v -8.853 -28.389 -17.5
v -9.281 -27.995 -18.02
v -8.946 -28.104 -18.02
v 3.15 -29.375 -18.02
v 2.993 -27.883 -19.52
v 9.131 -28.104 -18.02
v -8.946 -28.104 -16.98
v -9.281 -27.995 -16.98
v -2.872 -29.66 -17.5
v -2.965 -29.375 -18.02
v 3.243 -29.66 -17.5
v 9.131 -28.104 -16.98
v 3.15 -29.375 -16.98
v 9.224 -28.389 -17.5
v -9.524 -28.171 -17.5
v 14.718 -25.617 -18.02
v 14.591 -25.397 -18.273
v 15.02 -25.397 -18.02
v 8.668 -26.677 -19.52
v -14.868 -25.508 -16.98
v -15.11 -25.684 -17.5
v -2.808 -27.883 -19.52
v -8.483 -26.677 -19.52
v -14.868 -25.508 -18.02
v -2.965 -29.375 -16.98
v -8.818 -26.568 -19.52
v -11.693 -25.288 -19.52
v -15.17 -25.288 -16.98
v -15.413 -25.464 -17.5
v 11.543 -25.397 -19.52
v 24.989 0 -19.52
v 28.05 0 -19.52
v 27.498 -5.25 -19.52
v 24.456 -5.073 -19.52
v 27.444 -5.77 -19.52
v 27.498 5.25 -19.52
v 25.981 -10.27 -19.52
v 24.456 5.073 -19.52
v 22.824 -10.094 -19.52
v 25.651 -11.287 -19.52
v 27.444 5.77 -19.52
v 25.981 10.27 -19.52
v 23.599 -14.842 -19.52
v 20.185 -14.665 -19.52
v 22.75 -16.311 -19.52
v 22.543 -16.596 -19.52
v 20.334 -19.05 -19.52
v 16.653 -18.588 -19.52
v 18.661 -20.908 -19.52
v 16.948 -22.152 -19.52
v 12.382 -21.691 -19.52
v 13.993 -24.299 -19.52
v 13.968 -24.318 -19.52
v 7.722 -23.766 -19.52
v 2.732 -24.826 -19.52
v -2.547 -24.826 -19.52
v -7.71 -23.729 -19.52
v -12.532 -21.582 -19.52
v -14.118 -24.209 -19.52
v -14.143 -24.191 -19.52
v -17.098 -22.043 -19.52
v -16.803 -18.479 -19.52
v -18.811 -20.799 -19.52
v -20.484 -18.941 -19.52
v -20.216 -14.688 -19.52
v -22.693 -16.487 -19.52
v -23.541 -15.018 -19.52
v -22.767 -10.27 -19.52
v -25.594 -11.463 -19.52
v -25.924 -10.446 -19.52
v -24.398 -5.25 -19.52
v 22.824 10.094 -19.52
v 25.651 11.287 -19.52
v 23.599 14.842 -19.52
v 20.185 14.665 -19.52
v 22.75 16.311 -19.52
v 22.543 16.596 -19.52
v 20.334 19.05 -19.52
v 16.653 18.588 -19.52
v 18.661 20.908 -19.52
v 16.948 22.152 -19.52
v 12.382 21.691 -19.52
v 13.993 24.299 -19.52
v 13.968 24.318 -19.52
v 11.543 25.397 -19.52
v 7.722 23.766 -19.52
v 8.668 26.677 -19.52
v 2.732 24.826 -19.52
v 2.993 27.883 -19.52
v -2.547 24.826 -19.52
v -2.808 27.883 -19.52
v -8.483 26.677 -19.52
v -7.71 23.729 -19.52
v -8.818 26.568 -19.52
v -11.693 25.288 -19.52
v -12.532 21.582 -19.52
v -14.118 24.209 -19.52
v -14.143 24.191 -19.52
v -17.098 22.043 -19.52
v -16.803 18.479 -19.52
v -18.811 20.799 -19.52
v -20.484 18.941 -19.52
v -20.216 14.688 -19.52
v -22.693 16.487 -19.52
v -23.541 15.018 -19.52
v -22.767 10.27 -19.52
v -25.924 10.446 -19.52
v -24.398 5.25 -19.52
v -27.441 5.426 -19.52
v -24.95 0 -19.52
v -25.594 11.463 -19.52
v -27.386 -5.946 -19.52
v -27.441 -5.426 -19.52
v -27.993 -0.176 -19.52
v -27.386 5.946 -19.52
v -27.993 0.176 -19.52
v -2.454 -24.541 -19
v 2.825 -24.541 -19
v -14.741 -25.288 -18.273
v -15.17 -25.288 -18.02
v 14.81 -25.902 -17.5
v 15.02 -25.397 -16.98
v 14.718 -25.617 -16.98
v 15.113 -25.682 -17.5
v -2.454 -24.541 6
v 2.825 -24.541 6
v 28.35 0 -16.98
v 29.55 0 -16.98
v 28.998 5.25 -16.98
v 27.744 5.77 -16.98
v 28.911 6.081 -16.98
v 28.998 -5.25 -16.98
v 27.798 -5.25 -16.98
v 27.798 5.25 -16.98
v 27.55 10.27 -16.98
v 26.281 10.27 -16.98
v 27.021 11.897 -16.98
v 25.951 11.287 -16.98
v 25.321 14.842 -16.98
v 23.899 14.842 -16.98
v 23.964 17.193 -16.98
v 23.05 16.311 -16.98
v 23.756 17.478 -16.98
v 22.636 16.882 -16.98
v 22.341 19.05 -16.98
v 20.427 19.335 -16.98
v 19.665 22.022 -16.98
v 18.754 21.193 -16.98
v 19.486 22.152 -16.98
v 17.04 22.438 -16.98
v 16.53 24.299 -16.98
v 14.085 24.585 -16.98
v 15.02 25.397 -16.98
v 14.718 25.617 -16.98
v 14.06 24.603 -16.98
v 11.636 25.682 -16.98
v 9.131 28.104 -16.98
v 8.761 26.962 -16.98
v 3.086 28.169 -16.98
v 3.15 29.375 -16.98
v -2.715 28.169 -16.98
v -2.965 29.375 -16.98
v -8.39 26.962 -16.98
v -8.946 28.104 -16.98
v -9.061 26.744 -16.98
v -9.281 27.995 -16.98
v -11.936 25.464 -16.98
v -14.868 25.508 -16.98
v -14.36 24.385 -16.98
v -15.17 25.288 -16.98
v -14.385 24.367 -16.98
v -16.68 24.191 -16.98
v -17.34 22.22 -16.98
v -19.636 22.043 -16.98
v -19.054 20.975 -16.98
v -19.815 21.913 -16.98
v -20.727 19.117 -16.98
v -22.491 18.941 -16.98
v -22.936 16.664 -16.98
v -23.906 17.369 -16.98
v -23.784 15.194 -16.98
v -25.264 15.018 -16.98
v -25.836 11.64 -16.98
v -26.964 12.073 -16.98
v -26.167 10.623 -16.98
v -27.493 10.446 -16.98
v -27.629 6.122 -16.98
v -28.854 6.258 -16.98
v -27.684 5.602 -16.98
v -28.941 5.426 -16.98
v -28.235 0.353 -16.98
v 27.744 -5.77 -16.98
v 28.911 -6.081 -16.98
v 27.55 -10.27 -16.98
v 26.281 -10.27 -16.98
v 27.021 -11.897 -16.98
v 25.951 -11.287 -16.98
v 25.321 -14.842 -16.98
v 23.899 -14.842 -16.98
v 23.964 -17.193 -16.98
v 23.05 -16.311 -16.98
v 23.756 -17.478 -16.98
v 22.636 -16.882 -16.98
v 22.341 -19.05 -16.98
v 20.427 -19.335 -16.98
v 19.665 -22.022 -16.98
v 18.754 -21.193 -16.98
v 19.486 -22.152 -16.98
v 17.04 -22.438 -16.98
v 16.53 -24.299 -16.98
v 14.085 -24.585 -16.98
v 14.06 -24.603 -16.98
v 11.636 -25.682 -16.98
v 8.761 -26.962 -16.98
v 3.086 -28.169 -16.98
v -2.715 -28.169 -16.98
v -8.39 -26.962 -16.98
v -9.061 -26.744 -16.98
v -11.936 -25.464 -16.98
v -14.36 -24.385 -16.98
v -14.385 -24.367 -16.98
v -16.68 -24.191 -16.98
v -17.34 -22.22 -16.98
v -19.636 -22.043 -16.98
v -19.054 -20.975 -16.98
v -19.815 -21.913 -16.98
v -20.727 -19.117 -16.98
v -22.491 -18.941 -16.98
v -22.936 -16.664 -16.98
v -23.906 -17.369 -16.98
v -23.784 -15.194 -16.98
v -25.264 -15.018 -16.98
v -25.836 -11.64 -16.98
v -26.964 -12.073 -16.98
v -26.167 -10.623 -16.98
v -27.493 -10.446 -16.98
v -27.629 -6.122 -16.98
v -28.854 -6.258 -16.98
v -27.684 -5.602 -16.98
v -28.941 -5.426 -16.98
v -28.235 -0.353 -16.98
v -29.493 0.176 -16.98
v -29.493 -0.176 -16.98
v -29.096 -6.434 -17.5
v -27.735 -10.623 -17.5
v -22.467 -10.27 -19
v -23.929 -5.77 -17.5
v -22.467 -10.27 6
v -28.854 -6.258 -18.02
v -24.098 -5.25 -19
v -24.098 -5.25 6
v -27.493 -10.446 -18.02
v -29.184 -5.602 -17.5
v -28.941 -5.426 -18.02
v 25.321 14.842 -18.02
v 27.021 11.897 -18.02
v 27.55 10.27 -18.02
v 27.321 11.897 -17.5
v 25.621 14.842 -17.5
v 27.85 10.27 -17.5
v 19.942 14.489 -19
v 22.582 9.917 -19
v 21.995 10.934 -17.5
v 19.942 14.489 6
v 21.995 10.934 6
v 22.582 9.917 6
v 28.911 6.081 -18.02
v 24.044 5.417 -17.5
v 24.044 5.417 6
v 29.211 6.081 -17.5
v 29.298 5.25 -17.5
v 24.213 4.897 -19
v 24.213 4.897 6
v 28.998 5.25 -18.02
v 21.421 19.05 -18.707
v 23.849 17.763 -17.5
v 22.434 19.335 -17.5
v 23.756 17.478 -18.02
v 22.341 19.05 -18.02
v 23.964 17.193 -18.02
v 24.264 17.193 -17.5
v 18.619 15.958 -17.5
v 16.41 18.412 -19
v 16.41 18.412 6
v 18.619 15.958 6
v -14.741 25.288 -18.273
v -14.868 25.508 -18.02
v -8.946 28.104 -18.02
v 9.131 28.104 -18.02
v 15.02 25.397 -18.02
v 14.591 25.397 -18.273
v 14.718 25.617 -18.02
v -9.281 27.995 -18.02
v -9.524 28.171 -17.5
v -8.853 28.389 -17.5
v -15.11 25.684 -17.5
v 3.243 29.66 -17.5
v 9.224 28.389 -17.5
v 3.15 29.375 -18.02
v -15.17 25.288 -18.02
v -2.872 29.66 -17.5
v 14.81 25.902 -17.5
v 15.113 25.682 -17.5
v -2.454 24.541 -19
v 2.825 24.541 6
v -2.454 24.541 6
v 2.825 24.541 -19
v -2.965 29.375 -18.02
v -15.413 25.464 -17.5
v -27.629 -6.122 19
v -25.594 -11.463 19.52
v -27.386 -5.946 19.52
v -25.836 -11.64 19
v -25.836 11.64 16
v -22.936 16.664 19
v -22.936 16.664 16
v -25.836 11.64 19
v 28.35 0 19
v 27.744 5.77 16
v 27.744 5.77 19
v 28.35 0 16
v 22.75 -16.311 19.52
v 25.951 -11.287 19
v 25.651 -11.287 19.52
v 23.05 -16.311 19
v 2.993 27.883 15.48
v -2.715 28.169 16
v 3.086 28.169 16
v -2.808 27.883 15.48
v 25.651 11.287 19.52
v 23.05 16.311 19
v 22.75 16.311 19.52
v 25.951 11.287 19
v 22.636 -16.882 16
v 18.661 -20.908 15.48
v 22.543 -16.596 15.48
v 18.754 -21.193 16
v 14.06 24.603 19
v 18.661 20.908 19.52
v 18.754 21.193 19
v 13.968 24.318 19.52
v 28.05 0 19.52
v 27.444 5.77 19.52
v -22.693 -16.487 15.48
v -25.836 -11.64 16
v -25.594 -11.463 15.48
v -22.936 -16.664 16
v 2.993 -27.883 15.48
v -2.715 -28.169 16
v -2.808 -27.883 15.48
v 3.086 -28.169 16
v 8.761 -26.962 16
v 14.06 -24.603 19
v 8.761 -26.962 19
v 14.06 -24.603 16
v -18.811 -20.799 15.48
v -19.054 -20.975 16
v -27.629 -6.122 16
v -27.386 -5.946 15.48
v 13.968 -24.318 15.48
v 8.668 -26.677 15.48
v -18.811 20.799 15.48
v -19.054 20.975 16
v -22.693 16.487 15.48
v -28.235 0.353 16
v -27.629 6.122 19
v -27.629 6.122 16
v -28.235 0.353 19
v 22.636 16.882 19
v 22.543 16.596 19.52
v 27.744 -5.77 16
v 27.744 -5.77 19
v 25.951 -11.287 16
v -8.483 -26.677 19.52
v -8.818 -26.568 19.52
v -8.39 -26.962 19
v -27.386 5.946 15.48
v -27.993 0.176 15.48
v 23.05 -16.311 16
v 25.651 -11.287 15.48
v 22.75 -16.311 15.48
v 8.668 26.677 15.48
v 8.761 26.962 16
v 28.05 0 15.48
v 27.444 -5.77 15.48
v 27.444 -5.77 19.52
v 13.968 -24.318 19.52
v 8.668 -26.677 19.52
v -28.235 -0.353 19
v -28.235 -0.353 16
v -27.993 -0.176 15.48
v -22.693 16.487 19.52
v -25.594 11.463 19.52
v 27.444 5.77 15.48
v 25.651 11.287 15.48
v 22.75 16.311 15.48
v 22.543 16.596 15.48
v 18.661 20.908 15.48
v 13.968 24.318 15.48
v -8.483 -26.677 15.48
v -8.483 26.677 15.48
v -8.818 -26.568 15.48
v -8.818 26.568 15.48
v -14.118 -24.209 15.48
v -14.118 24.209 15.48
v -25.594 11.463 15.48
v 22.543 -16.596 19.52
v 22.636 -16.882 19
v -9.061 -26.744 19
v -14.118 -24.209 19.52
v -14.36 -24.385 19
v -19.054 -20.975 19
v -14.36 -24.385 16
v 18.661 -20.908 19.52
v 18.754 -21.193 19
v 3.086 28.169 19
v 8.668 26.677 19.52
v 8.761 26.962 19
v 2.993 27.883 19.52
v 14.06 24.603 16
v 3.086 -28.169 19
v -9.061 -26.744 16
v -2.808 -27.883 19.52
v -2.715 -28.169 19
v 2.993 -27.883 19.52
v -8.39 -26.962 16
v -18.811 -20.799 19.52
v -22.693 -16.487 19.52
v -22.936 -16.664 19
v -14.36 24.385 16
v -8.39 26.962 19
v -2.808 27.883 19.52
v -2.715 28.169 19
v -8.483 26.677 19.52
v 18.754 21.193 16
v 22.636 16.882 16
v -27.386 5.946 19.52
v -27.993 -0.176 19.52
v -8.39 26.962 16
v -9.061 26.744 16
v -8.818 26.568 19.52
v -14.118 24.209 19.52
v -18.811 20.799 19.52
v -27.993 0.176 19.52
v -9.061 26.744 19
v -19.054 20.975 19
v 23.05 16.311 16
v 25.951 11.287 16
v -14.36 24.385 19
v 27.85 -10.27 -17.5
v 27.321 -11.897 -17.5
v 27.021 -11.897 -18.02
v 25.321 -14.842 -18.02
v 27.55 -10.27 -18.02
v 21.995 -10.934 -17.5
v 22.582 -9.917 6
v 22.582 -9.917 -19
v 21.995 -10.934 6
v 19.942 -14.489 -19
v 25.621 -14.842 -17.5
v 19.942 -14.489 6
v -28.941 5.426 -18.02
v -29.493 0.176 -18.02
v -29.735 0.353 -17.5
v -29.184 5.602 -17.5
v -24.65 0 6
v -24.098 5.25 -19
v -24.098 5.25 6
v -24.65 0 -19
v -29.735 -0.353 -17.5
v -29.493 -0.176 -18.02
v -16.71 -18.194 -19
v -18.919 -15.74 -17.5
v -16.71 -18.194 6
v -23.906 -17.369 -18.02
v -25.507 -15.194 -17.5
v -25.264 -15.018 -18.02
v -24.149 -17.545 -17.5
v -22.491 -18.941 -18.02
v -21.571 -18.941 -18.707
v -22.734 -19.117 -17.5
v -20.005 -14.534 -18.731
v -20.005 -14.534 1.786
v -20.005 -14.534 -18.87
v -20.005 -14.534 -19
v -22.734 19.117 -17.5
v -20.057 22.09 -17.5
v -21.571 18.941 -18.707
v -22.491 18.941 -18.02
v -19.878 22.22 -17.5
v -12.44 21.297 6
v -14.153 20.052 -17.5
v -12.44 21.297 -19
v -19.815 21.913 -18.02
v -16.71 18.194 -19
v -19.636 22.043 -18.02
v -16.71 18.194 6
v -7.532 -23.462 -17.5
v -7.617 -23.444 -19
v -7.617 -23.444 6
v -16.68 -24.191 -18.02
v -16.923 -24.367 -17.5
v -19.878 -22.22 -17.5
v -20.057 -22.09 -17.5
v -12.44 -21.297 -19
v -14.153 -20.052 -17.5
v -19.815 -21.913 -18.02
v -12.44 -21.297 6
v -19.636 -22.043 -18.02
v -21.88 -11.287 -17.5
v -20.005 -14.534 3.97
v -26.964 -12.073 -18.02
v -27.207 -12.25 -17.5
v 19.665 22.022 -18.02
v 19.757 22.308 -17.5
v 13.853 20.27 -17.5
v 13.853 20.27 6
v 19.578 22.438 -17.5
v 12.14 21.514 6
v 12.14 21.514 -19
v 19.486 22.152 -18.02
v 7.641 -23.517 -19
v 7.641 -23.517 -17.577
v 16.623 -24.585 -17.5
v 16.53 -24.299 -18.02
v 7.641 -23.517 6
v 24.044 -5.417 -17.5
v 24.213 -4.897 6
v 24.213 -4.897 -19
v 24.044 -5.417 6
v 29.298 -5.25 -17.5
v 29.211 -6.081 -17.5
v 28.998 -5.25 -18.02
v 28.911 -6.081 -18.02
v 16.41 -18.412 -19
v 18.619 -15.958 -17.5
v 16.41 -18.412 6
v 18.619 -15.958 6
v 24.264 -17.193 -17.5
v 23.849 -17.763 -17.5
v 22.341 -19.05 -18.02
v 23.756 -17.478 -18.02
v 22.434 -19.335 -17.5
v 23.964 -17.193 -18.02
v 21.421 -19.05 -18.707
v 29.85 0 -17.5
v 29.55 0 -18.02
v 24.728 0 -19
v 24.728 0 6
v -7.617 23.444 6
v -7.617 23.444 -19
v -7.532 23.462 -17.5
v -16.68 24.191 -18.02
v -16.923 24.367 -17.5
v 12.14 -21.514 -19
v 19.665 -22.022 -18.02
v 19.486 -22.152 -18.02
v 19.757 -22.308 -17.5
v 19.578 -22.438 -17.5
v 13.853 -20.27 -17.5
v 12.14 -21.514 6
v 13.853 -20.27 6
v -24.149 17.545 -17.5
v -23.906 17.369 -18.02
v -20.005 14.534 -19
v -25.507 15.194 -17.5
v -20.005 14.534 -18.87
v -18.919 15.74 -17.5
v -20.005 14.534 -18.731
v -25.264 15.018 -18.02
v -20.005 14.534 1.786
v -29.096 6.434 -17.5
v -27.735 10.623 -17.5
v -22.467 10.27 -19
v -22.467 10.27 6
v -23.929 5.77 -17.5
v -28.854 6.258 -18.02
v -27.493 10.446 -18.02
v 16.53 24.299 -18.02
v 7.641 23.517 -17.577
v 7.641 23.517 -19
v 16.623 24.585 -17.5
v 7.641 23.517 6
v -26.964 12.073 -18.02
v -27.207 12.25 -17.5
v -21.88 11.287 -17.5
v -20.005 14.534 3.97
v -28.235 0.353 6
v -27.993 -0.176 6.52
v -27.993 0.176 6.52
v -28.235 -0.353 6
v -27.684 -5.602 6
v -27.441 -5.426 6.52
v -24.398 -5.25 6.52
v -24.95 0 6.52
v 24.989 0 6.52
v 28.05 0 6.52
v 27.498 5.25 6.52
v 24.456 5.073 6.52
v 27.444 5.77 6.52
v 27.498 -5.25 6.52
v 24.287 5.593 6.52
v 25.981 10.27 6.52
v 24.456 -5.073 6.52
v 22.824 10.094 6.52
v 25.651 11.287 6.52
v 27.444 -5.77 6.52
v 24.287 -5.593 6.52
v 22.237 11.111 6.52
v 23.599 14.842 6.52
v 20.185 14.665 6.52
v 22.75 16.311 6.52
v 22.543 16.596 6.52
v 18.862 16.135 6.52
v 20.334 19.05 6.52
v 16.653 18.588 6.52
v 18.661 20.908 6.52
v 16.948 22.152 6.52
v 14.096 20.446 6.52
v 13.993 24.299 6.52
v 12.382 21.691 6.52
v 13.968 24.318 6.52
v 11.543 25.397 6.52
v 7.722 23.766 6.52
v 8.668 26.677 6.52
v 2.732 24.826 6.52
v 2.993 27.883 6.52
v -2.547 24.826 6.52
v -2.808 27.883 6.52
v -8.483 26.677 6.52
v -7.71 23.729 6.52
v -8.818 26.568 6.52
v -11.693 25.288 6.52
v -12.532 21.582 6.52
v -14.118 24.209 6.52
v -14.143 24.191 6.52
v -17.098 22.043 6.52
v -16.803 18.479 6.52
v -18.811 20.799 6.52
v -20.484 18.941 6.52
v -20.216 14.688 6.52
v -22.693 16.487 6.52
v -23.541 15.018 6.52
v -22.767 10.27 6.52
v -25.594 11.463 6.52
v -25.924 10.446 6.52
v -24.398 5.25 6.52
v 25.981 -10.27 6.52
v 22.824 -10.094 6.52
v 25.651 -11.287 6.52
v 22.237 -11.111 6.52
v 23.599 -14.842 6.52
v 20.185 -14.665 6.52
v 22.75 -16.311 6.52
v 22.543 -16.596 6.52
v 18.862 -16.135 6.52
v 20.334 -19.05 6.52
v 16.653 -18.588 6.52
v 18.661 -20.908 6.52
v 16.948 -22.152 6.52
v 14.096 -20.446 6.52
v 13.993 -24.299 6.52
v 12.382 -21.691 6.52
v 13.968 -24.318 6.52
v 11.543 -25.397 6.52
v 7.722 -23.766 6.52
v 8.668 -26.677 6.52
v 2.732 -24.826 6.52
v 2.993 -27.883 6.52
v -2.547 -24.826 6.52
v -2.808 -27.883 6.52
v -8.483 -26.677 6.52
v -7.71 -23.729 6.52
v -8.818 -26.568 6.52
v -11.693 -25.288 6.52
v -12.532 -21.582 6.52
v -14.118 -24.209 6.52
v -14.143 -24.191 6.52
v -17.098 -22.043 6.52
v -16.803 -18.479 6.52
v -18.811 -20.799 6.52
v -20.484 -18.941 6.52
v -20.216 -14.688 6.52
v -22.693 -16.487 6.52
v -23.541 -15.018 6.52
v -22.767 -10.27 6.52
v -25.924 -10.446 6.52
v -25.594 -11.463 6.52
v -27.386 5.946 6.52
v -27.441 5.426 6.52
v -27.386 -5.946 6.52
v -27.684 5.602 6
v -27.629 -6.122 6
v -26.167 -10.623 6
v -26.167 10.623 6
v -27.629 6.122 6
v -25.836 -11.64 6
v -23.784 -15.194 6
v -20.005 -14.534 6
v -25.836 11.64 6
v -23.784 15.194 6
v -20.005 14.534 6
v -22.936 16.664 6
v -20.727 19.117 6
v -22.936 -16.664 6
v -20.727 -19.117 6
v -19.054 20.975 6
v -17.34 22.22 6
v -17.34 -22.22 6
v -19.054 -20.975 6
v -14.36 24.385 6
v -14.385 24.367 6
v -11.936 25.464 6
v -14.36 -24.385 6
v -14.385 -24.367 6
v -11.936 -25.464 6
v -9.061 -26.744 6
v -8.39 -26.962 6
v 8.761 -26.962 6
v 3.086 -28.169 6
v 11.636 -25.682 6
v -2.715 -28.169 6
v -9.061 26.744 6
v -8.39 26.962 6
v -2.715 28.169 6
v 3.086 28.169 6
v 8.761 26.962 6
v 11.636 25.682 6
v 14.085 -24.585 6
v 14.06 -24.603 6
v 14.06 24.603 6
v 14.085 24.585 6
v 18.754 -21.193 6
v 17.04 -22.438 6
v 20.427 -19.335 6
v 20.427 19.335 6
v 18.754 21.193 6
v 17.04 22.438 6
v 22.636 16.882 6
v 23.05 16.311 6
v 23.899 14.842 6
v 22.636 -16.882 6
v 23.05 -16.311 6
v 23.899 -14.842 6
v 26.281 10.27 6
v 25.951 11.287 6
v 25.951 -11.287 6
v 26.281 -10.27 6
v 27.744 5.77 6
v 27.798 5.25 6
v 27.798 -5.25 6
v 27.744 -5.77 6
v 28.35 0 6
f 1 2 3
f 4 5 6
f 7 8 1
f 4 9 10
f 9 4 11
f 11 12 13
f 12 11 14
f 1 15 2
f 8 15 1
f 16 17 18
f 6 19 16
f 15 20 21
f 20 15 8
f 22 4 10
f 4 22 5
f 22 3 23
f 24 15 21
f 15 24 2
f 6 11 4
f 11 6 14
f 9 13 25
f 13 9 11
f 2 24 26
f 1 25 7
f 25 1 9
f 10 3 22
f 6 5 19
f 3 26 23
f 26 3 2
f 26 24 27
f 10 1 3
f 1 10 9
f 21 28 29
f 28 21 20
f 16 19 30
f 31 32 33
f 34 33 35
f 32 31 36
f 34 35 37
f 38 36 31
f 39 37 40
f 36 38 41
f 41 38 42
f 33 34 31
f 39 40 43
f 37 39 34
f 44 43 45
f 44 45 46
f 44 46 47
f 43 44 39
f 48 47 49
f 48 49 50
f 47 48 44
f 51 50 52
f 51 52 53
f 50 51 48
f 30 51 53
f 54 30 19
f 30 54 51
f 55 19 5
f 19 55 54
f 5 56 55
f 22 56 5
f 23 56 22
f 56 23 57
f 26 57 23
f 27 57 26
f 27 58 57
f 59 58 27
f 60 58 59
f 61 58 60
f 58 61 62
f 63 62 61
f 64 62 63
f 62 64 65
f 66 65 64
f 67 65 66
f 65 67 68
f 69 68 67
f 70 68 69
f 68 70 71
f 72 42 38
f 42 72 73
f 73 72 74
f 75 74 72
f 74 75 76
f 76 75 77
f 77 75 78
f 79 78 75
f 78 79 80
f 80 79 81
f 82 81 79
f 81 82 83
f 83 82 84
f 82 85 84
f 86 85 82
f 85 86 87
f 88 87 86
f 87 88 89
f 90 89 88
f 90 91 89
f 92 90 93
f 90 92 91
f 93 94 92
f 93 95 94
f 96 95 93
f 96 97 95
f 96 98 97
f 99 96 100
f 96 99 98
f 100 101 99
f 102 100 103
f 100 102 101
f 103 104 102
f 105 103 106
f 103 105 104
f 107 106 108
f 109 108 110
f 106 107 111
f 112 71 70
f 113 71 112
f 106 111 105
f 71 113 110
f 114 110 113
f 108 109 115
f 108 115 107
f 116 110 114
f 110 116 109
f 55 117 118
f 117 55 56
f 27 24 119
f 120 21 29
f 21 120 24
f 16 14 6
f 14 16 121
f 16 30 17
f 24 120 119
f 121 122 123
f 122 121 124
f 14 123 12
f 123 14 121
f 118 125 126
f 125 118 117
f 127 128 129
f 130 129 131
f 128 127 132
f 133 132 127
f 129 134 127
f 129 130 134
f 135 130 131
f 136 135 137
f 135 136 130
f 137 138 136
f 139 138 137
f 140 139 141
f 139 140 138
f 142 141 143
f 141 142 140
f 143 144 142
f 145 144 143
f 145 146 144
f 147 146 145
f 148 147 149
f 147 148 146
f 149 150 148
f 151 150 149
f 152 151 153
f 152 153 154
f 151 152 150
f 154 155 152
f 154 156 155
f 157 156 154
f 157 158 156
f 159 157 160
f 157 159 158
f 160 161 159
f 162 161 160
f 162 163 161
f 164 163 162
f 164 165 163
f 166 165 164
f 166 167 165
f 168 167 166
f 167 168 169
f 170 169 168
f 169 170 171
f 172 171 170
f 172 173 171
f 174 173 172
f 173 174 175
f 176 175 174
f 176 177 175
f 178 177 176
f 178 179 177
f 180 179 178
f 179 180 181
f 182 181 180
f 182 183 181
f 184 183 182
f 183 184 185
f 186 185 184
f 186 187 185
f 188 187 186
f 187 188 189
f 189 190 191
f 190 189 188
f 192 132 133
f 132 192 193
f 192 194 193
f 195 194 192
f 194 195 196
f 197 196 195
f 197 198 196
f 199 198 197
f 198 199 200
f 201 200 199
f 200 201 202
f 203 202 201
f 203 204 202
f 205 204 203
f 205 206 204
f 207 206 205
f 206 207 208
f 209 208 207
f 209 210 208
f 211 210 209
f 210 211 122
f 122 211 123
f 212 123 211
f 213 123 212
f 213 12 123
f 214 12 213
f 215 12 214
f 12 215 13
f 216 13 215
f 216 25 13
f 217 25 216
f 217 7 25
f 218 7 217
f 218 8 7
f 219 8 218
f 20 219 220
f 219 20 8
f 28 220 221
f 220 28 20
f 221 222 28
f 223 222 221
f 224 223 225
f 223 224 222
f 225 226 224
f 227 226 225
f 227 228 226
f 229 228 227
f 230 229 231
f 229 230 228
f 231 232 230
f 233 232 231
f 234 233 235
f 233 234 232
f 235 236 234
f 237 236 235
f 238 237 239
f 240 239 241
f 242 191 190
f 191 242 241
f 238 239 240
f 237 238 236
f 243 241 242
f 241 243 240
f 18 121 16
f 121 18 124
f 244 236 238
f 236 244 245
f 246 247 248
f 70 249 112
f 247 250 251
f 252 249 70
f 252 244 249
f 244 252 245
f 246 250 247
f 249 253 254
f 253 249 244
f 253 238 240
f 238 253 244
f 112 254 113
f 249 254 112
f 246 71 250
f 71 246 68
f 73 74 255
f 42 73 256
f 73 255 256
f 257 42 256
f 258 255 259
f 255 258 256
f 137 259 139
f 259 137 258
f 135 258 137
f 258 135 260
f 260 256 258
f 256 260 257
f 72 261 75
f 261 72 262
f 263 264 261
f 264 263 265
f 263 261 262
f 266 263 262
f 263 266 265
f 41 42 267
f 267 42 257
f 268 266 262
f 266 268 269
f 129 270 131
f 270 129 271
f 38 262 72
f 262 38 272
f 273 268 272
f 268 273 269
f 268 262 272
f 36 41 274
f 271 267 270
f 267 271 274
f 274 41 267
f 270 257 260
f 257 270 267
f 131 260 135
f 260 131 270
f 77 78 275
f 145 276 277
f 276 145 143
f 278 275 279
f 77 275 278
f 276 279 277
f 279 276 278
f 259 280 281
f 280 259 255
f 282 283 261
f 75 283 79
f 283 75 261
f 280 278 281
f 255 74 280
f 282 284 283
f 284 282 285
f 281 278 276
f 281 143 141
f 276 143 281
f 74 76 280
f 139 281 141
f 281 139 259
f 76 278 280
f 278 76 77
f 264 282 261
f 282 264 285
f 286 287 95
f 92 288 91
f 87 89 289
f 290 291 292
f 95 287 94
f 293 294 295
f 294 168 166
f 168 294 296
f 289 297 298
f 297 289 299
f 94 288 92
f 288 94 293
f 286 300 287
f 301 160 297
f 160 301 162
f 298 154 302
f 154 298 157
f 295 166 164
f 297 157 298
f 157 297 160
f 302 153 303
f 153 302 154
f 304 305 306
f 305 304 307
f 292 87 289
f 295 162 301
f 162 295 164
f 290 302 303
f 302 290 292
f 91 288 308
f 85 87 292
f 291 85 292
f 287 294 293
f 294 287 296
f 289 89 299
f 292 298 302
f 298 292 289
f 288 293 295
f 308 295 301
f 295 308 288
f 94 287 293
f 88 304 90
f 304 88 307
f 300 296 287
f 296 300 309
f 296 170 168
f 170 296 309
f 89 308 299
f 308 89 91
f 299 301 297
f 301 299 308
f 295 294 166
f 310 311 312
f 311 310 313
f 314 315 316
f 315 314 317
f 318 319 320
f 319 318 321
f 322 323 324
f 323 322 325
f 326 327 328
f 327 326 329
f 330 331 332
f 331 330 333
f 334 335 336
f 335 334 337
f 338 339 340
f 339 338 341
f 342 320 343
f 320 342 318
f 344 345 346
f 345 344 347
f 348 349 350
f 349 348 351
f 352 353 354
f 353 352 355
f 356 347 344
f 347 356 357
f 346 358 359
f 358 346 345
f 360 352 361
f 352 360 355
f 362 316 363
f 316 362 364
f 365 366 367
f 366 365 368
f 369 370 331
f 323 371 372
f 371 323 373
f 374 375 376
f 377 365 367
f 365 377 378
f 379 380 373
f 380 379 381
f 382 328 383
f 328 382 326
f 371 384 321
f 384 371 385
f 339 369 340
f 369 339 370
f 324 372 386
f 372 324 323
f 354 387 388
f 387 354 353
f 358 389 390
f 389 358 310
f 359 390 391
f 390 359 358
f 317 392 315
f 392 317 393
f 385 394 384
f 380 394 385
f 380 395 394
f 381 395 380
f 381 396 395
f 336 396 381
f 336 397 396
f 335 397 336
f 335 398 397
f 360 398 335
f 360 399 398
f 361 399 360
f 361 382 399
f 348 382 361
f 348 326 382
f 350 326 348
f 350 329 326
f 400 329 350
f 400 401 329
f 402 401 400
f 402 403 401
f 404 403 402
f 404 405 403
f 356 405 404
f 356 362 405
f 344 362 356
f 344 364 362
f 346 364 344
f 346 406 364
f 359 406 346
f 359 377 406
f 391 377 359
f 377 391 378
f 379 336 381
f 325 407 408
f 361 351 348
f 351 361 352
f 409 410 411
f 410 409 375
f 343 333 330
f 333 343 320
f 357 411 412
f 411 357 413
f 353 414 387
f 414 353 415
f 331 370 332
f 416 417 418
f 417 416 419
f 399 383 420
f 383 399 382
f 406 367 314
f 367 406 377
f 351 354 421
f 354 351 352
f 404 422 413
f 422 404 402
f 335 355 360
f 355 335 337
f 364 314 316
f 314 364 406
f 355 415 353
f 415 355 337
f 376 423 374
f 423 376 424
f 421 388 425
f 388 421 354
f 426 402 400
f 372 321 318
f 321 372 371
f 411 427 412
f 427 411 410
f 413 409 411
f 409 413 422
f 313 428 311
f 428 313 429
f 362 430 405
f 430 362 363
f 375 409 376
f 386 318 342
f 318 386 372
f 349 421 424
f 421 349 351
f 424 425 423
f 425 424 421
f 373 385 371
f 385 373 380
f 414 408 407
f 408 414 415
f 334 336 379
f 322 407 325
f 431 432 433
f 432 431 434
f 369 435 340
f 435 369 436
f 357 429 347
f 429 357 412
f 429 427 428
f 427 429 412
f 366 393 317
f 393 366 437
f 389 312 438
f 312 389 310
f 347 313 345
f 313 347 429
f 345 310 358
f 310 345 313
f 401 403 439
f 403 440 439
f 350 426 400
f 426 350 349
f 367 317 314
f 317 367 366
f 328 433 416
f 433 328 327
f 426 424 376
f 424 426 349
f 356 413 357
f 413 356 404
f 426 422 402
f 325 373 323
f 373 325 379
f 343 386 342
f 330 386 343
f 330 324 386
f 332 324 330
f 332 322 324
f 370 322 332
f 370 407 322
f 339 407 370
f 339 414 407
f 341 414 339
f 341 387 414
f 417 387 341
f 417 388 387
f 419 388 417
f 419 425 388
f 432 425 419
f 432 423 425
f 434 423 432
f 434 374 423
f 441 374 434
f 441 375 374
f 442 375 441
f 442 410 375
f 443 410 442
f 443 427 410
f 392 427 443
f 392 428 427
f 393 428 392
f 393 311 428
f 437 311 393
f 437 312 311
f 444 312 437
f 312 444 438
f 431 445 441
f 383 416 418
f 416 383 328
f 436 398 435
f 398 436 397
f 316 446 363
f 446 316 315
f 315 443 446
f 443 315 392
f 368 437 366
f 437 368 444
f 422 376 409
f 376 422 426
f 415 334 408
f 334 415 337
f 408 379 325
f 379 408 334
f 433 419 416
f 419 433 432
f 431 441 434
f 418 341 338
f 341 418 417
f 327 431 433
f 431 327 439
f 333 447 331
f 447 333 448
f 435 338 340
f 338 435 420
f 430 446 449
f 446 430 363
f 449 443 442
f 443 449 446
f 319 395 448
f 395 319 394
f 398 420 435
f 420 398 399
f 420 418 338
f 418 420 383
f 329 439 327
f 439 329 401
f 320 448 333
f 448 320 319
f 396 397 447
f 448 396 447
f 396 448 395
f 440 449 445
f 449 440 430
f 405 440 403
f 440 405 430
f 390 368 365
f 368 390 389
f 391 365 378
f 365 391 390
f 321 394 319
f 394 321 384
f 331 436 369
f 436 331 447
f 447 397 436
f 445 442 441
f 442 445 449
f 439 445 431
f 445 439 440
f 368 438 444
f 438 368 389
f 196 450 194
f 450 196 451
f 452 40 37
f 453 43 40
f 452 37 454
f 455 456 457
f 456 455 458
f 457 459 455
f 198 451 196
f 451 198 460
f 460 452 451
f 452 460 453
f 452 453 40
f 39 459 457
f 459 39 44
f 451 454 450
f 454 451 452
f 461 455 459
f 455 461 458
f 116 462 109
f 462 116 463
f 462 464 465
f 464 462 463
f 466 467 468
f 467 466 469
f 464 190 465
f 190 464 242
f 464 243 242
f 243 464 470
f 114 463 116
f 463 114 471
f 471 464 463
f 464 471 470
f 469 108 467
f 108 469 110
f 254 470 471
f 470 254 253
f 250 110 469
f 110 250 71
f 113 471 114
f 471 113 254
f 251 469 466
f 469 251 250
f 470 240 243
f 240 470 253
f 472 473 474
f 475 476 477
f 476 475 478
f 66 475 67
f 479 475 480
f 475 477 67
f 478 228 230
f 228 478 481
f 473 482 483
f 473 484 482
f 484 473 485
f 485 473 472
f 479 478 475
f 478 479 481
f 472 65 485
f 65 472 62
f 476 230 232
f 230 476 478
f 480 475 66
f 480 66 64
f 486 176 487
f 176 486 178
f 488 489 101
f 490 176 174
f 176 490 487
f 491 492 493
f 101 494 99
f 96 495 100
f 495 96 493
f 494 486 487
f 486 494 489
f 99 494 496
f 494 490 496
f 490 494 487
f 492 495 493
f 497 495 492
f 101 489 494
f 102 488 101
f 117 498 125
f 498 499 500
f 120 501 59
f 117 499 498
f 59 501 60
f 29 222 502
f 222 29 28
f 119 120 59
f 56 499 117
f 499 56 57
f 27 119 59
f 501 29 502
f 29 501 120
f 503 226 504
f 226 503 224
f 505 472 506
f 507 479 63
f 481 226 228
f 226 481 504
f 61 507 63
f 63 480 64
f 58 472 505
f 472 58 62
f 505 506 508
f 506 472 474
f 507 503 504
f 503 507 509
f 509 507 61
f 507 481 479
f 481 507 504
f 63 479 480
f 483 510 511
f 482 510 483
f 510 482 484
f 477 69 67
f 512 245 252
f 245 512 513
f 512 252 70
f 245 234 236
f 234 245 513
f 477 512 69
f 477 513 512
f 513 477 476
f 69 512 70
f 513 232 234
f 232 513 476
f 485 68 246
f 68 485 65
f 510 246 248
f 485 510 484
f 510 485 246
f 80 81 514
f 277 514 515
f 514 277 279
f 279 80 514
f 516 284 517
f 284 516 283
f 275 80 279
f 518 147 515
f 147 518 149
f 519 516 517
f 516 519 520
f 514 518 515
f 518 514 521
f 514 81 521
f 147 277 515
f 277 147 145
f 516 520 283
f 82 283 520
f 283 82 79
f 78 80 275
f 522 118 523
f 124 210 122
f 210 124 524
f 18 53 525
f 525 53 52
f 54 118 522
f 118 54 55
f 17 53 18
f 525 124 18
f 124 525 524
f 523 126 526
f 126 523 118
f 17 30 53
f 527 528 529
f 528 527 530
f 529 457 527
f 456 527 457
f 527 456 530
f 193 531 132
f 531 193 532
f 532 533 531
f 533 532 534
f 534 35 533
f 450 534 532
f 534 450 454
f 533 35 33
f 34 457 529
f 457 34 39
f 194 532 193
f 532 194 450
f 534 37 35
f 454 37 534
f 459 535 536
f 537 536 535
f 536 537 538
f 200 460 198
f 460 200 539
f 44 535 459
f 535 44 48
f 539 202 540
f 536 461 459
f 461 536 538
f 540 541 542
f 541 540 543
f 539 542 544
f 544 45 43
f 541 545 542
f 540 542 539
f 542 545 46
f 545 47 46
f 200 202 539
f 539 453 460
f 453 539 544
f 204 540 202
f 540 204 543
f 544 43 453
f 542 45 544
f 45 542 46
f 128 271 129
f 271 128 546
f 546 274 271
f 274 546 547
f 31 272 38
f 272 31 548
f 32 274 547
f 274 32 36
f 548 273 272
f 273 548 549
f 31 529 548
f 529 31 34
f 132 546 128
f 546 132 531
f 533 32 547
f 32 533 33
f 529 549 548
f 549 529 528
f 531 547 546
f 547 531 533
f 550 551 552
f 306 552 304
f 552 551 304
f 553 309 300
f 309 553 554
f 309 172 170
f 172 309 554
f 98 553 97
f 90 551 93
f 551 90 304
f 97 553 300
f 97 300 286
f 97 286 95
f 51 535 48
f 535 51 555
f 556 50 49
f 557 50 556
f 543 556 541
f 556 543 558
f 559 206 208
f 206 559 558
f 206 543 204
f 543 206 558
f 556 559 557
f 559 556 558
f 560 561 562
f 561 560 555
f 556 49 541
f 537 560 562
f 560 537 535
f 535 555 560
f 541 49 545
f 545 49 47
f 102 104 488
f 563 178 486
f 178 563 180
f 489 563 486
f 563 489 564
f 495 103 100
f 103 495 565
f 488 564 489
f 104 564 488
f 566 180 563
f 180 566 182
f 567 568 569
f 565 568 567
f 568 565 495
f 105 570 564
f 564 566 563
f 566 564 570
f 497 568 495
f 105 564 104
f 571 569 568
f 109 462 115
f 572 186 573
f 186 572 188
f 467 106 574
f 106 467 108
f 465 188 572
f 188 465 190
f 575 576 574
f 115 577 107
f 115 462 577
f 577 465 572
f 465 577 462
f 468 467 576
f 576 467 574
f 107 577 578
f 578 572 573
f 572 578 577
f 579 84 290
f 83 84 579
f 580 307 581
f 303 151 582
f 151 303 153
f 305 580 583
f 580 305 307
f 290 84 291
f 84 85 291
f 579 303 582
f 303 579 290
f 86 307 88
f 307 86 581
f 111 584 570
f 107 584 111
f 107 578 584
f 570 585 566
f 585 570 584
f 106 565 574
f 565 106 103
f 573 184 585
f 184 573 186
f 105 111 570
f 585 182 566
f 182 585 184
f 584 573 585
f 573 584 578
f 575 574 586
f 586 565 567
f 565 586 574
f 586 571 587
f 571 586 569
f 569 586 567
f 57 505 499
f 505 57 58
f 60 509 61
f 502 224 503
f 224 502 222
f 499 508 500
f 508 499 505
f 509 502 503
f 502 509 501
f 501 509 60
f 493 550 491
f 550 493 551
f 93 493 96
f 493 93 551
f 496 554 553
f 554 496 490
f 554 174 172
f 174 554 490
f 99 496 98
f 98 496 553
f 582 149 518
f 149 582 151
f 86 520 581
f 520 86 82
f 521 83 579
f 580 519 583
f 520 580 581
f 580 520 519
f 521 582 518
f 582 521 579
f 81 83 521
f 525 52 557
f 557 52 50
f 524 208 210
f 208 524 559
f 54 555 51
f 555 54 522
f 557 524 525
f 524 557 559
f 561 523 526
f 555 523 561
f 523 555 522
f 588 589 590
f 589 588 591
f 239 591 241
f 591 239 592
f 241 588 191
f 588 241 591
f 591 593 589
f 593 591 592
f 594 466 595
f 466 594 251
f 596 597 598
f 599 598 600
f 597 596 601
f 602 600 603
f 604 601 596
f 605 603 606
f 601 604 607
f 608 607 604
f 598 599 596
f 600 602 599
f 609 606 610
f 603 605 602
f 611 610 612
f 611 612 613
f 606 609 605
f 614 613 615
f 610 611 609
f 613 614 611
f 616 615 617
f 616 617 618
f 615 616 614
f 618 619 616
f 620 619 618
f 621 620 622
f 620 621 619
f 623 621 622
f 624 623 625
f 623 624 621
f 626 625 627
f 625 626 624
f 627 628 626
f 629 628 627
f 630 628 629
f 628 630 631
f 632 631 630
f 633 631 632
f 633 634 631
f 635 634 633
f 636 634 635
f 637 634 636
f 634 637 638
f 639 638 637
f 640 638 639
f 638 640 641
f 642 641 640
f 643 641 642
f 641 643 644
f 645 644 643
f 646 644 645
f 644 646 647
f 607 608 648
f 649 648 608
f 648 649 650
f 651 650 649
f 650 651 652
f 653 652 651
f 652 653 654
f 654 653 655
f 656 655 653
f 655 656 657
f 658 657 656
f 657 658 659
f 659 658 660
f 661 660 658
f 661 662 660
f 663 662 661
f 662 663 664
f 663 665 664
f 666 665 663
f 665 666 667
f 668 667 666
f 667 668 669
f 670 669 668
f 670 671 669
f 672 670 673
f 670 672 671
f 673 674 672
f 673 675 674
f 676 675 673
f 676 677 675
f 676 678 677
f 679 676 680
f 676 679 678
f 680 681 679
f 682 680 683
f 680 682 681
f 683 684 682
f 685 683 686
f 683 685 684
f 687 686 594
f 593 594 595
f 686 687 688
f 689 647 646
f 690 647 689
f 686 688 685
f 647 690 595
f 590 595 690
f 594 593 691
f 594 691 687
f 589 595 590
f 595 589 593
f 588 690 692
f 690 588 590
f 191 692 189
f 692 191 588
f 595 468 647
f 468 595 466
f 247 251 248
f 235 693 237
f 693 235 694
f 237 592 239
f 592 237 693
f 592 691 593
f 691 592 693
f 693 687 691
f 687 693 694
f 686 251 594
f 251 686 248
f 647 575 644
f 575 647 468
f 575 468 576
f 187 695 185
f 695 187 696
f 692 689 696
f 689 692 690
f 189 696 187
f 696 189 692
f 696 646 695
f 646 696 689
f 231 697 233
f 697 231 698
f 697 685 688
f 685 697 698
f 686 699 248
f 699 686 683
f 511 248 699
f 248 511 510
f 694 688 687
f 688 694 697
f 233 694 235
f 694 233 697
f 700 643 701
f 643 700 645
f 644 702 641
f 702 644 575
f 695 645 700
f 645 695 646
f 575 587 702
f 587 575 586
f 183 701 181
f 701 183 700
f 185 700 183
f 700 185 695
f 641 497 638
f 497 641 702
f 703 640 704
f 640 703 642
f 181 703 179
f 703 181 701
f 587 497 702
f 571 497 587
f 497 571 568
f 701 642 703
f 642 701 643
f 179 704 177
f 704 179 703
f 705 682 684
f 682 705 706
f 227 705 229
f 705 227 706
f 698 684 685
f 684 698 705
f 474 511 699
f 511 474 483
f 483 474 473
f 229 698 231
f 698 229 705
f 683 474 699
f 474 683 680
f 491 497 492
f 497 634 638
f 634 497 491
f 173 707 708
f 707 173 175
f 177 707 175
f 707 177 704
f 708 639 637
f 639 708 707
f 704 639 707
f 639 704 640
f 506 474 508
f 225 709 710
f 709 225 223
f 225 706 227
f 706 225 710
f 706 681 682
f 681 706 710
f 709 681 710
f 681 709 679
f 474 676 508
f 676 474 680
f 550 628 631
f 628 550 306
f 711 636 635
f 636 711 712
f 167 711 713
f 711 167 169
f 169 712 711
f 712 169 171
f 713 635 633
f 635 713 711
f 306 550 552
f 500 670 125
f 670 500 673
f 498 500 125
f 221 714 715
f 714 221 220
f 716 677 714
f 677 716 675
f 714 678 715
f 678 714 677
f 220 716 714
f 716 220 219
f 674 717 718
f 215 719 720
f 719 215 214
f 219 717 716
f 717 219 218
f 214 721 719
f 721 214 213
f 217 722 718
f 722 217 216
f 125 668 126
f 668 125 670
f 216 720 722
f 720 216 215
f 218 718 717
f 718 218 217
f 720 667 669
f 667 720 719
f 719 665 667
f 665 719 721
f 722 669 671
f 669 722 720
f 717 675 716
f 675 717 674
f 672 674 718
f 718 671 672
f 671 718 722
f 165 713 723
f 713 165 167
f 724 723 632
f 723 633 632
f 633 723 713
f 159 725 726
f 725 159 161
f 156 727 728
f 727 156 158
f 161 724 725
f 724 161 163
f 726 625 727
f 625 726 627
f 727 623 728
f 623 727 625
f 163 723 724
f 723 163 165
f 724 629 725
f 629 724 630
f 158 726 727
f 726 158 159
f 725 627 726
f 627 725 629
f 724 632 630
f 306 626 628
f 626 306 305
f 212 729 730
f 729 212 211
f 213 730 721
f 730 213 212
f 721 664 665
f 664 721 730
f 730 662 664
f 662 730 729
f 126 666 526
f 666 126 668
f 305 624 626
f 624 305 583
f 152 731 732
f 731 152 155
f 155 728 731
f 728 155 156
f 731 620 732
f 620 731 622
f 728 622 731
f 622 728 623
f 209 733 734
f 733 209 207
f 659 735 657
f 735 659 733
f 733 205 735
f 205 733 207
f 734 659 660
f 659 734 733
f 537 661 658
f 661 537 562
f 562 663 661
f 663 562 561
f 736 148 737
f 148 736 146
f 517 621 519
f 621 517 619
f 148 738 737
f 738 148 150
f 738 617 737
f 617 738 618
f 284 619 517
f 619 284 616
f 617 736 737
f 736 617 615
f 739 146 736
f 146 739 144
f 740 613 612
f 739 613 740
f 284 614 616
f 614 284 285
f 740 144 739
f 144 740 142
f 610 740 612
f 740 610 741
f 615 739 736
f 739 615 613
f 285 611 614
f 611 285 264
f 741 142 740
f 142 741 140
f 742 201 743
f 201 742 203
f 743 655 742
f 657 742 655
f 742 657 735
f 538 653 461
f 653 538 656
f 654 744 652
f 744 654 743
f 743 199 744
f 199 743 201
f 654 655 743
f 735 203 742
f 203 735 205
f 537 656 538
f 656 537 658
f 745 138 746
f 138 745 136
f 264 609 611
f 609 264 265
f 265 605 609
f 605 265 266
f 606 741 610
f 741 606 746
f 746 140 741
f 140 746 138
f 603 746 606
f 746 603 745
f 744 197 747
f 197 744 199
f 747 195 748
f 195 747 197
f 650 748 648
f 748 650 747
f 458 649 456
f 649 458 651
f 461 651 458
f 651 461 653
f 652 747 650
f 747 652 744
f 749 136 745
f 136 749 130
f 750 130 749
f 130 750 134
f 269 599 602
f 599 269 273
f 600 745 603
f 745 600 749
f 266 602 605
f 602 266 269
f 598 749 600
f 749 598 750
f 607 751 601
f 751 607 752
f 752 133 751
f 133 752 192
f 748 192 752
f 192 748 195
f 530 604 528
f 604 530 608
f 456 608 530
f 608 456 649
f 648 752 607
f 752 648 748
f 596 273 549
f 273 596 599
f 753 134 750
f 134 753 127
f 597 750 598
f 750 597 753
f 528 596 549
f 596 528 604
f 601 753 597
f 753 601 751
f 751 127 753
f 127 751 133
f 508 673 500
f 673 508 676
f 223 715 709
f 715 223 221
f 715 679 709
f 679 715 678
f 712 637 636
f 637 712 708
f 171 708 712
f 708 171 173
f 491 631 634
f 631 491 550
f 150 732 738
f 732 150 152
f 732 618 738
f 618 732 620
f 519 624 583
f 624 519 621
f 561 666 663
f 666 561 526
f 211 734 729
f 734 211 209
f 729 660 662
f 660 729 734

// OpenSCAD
// Parameters
nominal_d = 50; //[25:100:1]
socket_id = 50.5; //[45:60:0.1]
wall_t = 2.5; //[1.2:5:0.1]
socket_len = 35; //[20:70:1]
end_wall_t = 3; //[1.5:8:0.1]
stop_shoulder_h = 2; //[1:6:0.1]
lead_in_chamfer = 1.5; //[0.5:4:0.1]
overlap = 1; //[0.5:2:0.1]
rib_count = 12; //[6:24:1]
rib_height = 0.8; //[0.3:2:0.1]
rib_width = 3; //[1.5:6:0.1]
rib_band_len = 18; //[8:30:1]
label_band_h = 0.4; //[0.2:1.2:0.1]
label_band_len = 10; //[5:20:1]
fillet_r = 0.6; //[0.2:1.5:0.1]

// Base Shapes
module cap_socket_body_outer() {
  cylinder(h = (socket_len + end_wall_t), r = (socket_id/2 + wall_t), center = true);
}

module cap_socket_body_inner_void() {
  translate([0, 0, -end_wall_t/2 - overlap/2])
    cylinder(h = (socket_len + overlap), r = (socket_id/2), center = true);
}

module lead_in_chamfer_outer() {
  translate([0, 0, - (socket_len + end_wall_t)/2 + lead_in_chamfer/2])
    cylinder(h = lead_in_chamfer, r1 = (socket_id/2 + wall_t), r2 = (socket_id/2 + wall_t + lead_in_chamfer), center = true);
}

module lead_in_chamfer_inner() {
  translate([0, 0, - (socket_len + end_wall_t)/2 + lead_in_chamfer/2])
    cylinder(h = lead_in_chamfer, r1 = (socket_id/2), r2 = (socket_id/2 + lead_in_chamfer), center = true);
}

module internal_stop_shoulder_ring() {
  translate([0, 0, (socket_len + end_wall_t)/2 - end_wall_t - stop_shoulder_h/2 + overlap])
    cylinder(h = stop_shoulder_h, r = (socket_id/2 + wall_t), center = true);
}

module internal_stop_shoulder_void() {
  translate([0, 0, (socket_len + end_wall_t)/2 - end_wall_t - stop_shoulder_h/2 + overlap])
    cylinder(h = (stop_shoulder_h + 2*overlap), r = (socket_id/2 - wall_t), center = true);
}

module outer_label_band_cyl() {
  translate([0, 0, (socket_len + end_wall_t)/2 - end_wall_t - label_band_len/2])
    cylinder(h = label_band_len, r = (socket_id/2 + wall_t + label_band_h), center = true);
}

module outer_grip_rib_proto() {
  translate([(socket_id/2 + wall_t + rib_height/2 - overlap), 0, - (socket_len + end_wall_t)/2 + lead_in_chamfer + rib_band_len/2])
    cube([rib_height, rib_width, rib_band_len], center = true);
}

module edge_fillet_sphere() {
  sphere(r = fillet_r, center = true);
}

// Operations
module cap_socket_body_shell() {
  difference() {
    cap_socket_body_outer();
    cap_socket_body_inner_void();
  }
}

module lead_in_chamfer_solid() {
  difference() {
    lead_in_chamfer_outer();
    lead_in_chamfer_inner();
  }
}

module cap_socket_with_chamfer() {
  union() {
    cap_socket_body_shell();
    lead_in_chamfer_solid();
  }
}

module internal_stop_shoulder() {
  difference() {
    internal_stop_shoulder_ring();
    internal_stop_shoulder_void();
  }
}

module cap_with_stop() {
  union() {
    cap_socket_with_chamfer();
    internal_stop_shoulder();
  }
}

module outer_label_band() {
  union() {
    cap_with_stop();
    outer_label_band_cyl();
  }
}

module outer_grip_ribs() {
  union() {
    for (i = [0:rib_count-1]) {
      rotate([0, 0, i*360/rib_count])
        outer_grip_rib_proto();
    }
  }
}

module cap_with_ribs_and_band() {
  union() {
    outer_label_band();
    outer_grip_ribs();
  }
}

// Final Output
minkowski() {
  cap_with_ribs_and_band();
  edge_fillet_sphere();
}
